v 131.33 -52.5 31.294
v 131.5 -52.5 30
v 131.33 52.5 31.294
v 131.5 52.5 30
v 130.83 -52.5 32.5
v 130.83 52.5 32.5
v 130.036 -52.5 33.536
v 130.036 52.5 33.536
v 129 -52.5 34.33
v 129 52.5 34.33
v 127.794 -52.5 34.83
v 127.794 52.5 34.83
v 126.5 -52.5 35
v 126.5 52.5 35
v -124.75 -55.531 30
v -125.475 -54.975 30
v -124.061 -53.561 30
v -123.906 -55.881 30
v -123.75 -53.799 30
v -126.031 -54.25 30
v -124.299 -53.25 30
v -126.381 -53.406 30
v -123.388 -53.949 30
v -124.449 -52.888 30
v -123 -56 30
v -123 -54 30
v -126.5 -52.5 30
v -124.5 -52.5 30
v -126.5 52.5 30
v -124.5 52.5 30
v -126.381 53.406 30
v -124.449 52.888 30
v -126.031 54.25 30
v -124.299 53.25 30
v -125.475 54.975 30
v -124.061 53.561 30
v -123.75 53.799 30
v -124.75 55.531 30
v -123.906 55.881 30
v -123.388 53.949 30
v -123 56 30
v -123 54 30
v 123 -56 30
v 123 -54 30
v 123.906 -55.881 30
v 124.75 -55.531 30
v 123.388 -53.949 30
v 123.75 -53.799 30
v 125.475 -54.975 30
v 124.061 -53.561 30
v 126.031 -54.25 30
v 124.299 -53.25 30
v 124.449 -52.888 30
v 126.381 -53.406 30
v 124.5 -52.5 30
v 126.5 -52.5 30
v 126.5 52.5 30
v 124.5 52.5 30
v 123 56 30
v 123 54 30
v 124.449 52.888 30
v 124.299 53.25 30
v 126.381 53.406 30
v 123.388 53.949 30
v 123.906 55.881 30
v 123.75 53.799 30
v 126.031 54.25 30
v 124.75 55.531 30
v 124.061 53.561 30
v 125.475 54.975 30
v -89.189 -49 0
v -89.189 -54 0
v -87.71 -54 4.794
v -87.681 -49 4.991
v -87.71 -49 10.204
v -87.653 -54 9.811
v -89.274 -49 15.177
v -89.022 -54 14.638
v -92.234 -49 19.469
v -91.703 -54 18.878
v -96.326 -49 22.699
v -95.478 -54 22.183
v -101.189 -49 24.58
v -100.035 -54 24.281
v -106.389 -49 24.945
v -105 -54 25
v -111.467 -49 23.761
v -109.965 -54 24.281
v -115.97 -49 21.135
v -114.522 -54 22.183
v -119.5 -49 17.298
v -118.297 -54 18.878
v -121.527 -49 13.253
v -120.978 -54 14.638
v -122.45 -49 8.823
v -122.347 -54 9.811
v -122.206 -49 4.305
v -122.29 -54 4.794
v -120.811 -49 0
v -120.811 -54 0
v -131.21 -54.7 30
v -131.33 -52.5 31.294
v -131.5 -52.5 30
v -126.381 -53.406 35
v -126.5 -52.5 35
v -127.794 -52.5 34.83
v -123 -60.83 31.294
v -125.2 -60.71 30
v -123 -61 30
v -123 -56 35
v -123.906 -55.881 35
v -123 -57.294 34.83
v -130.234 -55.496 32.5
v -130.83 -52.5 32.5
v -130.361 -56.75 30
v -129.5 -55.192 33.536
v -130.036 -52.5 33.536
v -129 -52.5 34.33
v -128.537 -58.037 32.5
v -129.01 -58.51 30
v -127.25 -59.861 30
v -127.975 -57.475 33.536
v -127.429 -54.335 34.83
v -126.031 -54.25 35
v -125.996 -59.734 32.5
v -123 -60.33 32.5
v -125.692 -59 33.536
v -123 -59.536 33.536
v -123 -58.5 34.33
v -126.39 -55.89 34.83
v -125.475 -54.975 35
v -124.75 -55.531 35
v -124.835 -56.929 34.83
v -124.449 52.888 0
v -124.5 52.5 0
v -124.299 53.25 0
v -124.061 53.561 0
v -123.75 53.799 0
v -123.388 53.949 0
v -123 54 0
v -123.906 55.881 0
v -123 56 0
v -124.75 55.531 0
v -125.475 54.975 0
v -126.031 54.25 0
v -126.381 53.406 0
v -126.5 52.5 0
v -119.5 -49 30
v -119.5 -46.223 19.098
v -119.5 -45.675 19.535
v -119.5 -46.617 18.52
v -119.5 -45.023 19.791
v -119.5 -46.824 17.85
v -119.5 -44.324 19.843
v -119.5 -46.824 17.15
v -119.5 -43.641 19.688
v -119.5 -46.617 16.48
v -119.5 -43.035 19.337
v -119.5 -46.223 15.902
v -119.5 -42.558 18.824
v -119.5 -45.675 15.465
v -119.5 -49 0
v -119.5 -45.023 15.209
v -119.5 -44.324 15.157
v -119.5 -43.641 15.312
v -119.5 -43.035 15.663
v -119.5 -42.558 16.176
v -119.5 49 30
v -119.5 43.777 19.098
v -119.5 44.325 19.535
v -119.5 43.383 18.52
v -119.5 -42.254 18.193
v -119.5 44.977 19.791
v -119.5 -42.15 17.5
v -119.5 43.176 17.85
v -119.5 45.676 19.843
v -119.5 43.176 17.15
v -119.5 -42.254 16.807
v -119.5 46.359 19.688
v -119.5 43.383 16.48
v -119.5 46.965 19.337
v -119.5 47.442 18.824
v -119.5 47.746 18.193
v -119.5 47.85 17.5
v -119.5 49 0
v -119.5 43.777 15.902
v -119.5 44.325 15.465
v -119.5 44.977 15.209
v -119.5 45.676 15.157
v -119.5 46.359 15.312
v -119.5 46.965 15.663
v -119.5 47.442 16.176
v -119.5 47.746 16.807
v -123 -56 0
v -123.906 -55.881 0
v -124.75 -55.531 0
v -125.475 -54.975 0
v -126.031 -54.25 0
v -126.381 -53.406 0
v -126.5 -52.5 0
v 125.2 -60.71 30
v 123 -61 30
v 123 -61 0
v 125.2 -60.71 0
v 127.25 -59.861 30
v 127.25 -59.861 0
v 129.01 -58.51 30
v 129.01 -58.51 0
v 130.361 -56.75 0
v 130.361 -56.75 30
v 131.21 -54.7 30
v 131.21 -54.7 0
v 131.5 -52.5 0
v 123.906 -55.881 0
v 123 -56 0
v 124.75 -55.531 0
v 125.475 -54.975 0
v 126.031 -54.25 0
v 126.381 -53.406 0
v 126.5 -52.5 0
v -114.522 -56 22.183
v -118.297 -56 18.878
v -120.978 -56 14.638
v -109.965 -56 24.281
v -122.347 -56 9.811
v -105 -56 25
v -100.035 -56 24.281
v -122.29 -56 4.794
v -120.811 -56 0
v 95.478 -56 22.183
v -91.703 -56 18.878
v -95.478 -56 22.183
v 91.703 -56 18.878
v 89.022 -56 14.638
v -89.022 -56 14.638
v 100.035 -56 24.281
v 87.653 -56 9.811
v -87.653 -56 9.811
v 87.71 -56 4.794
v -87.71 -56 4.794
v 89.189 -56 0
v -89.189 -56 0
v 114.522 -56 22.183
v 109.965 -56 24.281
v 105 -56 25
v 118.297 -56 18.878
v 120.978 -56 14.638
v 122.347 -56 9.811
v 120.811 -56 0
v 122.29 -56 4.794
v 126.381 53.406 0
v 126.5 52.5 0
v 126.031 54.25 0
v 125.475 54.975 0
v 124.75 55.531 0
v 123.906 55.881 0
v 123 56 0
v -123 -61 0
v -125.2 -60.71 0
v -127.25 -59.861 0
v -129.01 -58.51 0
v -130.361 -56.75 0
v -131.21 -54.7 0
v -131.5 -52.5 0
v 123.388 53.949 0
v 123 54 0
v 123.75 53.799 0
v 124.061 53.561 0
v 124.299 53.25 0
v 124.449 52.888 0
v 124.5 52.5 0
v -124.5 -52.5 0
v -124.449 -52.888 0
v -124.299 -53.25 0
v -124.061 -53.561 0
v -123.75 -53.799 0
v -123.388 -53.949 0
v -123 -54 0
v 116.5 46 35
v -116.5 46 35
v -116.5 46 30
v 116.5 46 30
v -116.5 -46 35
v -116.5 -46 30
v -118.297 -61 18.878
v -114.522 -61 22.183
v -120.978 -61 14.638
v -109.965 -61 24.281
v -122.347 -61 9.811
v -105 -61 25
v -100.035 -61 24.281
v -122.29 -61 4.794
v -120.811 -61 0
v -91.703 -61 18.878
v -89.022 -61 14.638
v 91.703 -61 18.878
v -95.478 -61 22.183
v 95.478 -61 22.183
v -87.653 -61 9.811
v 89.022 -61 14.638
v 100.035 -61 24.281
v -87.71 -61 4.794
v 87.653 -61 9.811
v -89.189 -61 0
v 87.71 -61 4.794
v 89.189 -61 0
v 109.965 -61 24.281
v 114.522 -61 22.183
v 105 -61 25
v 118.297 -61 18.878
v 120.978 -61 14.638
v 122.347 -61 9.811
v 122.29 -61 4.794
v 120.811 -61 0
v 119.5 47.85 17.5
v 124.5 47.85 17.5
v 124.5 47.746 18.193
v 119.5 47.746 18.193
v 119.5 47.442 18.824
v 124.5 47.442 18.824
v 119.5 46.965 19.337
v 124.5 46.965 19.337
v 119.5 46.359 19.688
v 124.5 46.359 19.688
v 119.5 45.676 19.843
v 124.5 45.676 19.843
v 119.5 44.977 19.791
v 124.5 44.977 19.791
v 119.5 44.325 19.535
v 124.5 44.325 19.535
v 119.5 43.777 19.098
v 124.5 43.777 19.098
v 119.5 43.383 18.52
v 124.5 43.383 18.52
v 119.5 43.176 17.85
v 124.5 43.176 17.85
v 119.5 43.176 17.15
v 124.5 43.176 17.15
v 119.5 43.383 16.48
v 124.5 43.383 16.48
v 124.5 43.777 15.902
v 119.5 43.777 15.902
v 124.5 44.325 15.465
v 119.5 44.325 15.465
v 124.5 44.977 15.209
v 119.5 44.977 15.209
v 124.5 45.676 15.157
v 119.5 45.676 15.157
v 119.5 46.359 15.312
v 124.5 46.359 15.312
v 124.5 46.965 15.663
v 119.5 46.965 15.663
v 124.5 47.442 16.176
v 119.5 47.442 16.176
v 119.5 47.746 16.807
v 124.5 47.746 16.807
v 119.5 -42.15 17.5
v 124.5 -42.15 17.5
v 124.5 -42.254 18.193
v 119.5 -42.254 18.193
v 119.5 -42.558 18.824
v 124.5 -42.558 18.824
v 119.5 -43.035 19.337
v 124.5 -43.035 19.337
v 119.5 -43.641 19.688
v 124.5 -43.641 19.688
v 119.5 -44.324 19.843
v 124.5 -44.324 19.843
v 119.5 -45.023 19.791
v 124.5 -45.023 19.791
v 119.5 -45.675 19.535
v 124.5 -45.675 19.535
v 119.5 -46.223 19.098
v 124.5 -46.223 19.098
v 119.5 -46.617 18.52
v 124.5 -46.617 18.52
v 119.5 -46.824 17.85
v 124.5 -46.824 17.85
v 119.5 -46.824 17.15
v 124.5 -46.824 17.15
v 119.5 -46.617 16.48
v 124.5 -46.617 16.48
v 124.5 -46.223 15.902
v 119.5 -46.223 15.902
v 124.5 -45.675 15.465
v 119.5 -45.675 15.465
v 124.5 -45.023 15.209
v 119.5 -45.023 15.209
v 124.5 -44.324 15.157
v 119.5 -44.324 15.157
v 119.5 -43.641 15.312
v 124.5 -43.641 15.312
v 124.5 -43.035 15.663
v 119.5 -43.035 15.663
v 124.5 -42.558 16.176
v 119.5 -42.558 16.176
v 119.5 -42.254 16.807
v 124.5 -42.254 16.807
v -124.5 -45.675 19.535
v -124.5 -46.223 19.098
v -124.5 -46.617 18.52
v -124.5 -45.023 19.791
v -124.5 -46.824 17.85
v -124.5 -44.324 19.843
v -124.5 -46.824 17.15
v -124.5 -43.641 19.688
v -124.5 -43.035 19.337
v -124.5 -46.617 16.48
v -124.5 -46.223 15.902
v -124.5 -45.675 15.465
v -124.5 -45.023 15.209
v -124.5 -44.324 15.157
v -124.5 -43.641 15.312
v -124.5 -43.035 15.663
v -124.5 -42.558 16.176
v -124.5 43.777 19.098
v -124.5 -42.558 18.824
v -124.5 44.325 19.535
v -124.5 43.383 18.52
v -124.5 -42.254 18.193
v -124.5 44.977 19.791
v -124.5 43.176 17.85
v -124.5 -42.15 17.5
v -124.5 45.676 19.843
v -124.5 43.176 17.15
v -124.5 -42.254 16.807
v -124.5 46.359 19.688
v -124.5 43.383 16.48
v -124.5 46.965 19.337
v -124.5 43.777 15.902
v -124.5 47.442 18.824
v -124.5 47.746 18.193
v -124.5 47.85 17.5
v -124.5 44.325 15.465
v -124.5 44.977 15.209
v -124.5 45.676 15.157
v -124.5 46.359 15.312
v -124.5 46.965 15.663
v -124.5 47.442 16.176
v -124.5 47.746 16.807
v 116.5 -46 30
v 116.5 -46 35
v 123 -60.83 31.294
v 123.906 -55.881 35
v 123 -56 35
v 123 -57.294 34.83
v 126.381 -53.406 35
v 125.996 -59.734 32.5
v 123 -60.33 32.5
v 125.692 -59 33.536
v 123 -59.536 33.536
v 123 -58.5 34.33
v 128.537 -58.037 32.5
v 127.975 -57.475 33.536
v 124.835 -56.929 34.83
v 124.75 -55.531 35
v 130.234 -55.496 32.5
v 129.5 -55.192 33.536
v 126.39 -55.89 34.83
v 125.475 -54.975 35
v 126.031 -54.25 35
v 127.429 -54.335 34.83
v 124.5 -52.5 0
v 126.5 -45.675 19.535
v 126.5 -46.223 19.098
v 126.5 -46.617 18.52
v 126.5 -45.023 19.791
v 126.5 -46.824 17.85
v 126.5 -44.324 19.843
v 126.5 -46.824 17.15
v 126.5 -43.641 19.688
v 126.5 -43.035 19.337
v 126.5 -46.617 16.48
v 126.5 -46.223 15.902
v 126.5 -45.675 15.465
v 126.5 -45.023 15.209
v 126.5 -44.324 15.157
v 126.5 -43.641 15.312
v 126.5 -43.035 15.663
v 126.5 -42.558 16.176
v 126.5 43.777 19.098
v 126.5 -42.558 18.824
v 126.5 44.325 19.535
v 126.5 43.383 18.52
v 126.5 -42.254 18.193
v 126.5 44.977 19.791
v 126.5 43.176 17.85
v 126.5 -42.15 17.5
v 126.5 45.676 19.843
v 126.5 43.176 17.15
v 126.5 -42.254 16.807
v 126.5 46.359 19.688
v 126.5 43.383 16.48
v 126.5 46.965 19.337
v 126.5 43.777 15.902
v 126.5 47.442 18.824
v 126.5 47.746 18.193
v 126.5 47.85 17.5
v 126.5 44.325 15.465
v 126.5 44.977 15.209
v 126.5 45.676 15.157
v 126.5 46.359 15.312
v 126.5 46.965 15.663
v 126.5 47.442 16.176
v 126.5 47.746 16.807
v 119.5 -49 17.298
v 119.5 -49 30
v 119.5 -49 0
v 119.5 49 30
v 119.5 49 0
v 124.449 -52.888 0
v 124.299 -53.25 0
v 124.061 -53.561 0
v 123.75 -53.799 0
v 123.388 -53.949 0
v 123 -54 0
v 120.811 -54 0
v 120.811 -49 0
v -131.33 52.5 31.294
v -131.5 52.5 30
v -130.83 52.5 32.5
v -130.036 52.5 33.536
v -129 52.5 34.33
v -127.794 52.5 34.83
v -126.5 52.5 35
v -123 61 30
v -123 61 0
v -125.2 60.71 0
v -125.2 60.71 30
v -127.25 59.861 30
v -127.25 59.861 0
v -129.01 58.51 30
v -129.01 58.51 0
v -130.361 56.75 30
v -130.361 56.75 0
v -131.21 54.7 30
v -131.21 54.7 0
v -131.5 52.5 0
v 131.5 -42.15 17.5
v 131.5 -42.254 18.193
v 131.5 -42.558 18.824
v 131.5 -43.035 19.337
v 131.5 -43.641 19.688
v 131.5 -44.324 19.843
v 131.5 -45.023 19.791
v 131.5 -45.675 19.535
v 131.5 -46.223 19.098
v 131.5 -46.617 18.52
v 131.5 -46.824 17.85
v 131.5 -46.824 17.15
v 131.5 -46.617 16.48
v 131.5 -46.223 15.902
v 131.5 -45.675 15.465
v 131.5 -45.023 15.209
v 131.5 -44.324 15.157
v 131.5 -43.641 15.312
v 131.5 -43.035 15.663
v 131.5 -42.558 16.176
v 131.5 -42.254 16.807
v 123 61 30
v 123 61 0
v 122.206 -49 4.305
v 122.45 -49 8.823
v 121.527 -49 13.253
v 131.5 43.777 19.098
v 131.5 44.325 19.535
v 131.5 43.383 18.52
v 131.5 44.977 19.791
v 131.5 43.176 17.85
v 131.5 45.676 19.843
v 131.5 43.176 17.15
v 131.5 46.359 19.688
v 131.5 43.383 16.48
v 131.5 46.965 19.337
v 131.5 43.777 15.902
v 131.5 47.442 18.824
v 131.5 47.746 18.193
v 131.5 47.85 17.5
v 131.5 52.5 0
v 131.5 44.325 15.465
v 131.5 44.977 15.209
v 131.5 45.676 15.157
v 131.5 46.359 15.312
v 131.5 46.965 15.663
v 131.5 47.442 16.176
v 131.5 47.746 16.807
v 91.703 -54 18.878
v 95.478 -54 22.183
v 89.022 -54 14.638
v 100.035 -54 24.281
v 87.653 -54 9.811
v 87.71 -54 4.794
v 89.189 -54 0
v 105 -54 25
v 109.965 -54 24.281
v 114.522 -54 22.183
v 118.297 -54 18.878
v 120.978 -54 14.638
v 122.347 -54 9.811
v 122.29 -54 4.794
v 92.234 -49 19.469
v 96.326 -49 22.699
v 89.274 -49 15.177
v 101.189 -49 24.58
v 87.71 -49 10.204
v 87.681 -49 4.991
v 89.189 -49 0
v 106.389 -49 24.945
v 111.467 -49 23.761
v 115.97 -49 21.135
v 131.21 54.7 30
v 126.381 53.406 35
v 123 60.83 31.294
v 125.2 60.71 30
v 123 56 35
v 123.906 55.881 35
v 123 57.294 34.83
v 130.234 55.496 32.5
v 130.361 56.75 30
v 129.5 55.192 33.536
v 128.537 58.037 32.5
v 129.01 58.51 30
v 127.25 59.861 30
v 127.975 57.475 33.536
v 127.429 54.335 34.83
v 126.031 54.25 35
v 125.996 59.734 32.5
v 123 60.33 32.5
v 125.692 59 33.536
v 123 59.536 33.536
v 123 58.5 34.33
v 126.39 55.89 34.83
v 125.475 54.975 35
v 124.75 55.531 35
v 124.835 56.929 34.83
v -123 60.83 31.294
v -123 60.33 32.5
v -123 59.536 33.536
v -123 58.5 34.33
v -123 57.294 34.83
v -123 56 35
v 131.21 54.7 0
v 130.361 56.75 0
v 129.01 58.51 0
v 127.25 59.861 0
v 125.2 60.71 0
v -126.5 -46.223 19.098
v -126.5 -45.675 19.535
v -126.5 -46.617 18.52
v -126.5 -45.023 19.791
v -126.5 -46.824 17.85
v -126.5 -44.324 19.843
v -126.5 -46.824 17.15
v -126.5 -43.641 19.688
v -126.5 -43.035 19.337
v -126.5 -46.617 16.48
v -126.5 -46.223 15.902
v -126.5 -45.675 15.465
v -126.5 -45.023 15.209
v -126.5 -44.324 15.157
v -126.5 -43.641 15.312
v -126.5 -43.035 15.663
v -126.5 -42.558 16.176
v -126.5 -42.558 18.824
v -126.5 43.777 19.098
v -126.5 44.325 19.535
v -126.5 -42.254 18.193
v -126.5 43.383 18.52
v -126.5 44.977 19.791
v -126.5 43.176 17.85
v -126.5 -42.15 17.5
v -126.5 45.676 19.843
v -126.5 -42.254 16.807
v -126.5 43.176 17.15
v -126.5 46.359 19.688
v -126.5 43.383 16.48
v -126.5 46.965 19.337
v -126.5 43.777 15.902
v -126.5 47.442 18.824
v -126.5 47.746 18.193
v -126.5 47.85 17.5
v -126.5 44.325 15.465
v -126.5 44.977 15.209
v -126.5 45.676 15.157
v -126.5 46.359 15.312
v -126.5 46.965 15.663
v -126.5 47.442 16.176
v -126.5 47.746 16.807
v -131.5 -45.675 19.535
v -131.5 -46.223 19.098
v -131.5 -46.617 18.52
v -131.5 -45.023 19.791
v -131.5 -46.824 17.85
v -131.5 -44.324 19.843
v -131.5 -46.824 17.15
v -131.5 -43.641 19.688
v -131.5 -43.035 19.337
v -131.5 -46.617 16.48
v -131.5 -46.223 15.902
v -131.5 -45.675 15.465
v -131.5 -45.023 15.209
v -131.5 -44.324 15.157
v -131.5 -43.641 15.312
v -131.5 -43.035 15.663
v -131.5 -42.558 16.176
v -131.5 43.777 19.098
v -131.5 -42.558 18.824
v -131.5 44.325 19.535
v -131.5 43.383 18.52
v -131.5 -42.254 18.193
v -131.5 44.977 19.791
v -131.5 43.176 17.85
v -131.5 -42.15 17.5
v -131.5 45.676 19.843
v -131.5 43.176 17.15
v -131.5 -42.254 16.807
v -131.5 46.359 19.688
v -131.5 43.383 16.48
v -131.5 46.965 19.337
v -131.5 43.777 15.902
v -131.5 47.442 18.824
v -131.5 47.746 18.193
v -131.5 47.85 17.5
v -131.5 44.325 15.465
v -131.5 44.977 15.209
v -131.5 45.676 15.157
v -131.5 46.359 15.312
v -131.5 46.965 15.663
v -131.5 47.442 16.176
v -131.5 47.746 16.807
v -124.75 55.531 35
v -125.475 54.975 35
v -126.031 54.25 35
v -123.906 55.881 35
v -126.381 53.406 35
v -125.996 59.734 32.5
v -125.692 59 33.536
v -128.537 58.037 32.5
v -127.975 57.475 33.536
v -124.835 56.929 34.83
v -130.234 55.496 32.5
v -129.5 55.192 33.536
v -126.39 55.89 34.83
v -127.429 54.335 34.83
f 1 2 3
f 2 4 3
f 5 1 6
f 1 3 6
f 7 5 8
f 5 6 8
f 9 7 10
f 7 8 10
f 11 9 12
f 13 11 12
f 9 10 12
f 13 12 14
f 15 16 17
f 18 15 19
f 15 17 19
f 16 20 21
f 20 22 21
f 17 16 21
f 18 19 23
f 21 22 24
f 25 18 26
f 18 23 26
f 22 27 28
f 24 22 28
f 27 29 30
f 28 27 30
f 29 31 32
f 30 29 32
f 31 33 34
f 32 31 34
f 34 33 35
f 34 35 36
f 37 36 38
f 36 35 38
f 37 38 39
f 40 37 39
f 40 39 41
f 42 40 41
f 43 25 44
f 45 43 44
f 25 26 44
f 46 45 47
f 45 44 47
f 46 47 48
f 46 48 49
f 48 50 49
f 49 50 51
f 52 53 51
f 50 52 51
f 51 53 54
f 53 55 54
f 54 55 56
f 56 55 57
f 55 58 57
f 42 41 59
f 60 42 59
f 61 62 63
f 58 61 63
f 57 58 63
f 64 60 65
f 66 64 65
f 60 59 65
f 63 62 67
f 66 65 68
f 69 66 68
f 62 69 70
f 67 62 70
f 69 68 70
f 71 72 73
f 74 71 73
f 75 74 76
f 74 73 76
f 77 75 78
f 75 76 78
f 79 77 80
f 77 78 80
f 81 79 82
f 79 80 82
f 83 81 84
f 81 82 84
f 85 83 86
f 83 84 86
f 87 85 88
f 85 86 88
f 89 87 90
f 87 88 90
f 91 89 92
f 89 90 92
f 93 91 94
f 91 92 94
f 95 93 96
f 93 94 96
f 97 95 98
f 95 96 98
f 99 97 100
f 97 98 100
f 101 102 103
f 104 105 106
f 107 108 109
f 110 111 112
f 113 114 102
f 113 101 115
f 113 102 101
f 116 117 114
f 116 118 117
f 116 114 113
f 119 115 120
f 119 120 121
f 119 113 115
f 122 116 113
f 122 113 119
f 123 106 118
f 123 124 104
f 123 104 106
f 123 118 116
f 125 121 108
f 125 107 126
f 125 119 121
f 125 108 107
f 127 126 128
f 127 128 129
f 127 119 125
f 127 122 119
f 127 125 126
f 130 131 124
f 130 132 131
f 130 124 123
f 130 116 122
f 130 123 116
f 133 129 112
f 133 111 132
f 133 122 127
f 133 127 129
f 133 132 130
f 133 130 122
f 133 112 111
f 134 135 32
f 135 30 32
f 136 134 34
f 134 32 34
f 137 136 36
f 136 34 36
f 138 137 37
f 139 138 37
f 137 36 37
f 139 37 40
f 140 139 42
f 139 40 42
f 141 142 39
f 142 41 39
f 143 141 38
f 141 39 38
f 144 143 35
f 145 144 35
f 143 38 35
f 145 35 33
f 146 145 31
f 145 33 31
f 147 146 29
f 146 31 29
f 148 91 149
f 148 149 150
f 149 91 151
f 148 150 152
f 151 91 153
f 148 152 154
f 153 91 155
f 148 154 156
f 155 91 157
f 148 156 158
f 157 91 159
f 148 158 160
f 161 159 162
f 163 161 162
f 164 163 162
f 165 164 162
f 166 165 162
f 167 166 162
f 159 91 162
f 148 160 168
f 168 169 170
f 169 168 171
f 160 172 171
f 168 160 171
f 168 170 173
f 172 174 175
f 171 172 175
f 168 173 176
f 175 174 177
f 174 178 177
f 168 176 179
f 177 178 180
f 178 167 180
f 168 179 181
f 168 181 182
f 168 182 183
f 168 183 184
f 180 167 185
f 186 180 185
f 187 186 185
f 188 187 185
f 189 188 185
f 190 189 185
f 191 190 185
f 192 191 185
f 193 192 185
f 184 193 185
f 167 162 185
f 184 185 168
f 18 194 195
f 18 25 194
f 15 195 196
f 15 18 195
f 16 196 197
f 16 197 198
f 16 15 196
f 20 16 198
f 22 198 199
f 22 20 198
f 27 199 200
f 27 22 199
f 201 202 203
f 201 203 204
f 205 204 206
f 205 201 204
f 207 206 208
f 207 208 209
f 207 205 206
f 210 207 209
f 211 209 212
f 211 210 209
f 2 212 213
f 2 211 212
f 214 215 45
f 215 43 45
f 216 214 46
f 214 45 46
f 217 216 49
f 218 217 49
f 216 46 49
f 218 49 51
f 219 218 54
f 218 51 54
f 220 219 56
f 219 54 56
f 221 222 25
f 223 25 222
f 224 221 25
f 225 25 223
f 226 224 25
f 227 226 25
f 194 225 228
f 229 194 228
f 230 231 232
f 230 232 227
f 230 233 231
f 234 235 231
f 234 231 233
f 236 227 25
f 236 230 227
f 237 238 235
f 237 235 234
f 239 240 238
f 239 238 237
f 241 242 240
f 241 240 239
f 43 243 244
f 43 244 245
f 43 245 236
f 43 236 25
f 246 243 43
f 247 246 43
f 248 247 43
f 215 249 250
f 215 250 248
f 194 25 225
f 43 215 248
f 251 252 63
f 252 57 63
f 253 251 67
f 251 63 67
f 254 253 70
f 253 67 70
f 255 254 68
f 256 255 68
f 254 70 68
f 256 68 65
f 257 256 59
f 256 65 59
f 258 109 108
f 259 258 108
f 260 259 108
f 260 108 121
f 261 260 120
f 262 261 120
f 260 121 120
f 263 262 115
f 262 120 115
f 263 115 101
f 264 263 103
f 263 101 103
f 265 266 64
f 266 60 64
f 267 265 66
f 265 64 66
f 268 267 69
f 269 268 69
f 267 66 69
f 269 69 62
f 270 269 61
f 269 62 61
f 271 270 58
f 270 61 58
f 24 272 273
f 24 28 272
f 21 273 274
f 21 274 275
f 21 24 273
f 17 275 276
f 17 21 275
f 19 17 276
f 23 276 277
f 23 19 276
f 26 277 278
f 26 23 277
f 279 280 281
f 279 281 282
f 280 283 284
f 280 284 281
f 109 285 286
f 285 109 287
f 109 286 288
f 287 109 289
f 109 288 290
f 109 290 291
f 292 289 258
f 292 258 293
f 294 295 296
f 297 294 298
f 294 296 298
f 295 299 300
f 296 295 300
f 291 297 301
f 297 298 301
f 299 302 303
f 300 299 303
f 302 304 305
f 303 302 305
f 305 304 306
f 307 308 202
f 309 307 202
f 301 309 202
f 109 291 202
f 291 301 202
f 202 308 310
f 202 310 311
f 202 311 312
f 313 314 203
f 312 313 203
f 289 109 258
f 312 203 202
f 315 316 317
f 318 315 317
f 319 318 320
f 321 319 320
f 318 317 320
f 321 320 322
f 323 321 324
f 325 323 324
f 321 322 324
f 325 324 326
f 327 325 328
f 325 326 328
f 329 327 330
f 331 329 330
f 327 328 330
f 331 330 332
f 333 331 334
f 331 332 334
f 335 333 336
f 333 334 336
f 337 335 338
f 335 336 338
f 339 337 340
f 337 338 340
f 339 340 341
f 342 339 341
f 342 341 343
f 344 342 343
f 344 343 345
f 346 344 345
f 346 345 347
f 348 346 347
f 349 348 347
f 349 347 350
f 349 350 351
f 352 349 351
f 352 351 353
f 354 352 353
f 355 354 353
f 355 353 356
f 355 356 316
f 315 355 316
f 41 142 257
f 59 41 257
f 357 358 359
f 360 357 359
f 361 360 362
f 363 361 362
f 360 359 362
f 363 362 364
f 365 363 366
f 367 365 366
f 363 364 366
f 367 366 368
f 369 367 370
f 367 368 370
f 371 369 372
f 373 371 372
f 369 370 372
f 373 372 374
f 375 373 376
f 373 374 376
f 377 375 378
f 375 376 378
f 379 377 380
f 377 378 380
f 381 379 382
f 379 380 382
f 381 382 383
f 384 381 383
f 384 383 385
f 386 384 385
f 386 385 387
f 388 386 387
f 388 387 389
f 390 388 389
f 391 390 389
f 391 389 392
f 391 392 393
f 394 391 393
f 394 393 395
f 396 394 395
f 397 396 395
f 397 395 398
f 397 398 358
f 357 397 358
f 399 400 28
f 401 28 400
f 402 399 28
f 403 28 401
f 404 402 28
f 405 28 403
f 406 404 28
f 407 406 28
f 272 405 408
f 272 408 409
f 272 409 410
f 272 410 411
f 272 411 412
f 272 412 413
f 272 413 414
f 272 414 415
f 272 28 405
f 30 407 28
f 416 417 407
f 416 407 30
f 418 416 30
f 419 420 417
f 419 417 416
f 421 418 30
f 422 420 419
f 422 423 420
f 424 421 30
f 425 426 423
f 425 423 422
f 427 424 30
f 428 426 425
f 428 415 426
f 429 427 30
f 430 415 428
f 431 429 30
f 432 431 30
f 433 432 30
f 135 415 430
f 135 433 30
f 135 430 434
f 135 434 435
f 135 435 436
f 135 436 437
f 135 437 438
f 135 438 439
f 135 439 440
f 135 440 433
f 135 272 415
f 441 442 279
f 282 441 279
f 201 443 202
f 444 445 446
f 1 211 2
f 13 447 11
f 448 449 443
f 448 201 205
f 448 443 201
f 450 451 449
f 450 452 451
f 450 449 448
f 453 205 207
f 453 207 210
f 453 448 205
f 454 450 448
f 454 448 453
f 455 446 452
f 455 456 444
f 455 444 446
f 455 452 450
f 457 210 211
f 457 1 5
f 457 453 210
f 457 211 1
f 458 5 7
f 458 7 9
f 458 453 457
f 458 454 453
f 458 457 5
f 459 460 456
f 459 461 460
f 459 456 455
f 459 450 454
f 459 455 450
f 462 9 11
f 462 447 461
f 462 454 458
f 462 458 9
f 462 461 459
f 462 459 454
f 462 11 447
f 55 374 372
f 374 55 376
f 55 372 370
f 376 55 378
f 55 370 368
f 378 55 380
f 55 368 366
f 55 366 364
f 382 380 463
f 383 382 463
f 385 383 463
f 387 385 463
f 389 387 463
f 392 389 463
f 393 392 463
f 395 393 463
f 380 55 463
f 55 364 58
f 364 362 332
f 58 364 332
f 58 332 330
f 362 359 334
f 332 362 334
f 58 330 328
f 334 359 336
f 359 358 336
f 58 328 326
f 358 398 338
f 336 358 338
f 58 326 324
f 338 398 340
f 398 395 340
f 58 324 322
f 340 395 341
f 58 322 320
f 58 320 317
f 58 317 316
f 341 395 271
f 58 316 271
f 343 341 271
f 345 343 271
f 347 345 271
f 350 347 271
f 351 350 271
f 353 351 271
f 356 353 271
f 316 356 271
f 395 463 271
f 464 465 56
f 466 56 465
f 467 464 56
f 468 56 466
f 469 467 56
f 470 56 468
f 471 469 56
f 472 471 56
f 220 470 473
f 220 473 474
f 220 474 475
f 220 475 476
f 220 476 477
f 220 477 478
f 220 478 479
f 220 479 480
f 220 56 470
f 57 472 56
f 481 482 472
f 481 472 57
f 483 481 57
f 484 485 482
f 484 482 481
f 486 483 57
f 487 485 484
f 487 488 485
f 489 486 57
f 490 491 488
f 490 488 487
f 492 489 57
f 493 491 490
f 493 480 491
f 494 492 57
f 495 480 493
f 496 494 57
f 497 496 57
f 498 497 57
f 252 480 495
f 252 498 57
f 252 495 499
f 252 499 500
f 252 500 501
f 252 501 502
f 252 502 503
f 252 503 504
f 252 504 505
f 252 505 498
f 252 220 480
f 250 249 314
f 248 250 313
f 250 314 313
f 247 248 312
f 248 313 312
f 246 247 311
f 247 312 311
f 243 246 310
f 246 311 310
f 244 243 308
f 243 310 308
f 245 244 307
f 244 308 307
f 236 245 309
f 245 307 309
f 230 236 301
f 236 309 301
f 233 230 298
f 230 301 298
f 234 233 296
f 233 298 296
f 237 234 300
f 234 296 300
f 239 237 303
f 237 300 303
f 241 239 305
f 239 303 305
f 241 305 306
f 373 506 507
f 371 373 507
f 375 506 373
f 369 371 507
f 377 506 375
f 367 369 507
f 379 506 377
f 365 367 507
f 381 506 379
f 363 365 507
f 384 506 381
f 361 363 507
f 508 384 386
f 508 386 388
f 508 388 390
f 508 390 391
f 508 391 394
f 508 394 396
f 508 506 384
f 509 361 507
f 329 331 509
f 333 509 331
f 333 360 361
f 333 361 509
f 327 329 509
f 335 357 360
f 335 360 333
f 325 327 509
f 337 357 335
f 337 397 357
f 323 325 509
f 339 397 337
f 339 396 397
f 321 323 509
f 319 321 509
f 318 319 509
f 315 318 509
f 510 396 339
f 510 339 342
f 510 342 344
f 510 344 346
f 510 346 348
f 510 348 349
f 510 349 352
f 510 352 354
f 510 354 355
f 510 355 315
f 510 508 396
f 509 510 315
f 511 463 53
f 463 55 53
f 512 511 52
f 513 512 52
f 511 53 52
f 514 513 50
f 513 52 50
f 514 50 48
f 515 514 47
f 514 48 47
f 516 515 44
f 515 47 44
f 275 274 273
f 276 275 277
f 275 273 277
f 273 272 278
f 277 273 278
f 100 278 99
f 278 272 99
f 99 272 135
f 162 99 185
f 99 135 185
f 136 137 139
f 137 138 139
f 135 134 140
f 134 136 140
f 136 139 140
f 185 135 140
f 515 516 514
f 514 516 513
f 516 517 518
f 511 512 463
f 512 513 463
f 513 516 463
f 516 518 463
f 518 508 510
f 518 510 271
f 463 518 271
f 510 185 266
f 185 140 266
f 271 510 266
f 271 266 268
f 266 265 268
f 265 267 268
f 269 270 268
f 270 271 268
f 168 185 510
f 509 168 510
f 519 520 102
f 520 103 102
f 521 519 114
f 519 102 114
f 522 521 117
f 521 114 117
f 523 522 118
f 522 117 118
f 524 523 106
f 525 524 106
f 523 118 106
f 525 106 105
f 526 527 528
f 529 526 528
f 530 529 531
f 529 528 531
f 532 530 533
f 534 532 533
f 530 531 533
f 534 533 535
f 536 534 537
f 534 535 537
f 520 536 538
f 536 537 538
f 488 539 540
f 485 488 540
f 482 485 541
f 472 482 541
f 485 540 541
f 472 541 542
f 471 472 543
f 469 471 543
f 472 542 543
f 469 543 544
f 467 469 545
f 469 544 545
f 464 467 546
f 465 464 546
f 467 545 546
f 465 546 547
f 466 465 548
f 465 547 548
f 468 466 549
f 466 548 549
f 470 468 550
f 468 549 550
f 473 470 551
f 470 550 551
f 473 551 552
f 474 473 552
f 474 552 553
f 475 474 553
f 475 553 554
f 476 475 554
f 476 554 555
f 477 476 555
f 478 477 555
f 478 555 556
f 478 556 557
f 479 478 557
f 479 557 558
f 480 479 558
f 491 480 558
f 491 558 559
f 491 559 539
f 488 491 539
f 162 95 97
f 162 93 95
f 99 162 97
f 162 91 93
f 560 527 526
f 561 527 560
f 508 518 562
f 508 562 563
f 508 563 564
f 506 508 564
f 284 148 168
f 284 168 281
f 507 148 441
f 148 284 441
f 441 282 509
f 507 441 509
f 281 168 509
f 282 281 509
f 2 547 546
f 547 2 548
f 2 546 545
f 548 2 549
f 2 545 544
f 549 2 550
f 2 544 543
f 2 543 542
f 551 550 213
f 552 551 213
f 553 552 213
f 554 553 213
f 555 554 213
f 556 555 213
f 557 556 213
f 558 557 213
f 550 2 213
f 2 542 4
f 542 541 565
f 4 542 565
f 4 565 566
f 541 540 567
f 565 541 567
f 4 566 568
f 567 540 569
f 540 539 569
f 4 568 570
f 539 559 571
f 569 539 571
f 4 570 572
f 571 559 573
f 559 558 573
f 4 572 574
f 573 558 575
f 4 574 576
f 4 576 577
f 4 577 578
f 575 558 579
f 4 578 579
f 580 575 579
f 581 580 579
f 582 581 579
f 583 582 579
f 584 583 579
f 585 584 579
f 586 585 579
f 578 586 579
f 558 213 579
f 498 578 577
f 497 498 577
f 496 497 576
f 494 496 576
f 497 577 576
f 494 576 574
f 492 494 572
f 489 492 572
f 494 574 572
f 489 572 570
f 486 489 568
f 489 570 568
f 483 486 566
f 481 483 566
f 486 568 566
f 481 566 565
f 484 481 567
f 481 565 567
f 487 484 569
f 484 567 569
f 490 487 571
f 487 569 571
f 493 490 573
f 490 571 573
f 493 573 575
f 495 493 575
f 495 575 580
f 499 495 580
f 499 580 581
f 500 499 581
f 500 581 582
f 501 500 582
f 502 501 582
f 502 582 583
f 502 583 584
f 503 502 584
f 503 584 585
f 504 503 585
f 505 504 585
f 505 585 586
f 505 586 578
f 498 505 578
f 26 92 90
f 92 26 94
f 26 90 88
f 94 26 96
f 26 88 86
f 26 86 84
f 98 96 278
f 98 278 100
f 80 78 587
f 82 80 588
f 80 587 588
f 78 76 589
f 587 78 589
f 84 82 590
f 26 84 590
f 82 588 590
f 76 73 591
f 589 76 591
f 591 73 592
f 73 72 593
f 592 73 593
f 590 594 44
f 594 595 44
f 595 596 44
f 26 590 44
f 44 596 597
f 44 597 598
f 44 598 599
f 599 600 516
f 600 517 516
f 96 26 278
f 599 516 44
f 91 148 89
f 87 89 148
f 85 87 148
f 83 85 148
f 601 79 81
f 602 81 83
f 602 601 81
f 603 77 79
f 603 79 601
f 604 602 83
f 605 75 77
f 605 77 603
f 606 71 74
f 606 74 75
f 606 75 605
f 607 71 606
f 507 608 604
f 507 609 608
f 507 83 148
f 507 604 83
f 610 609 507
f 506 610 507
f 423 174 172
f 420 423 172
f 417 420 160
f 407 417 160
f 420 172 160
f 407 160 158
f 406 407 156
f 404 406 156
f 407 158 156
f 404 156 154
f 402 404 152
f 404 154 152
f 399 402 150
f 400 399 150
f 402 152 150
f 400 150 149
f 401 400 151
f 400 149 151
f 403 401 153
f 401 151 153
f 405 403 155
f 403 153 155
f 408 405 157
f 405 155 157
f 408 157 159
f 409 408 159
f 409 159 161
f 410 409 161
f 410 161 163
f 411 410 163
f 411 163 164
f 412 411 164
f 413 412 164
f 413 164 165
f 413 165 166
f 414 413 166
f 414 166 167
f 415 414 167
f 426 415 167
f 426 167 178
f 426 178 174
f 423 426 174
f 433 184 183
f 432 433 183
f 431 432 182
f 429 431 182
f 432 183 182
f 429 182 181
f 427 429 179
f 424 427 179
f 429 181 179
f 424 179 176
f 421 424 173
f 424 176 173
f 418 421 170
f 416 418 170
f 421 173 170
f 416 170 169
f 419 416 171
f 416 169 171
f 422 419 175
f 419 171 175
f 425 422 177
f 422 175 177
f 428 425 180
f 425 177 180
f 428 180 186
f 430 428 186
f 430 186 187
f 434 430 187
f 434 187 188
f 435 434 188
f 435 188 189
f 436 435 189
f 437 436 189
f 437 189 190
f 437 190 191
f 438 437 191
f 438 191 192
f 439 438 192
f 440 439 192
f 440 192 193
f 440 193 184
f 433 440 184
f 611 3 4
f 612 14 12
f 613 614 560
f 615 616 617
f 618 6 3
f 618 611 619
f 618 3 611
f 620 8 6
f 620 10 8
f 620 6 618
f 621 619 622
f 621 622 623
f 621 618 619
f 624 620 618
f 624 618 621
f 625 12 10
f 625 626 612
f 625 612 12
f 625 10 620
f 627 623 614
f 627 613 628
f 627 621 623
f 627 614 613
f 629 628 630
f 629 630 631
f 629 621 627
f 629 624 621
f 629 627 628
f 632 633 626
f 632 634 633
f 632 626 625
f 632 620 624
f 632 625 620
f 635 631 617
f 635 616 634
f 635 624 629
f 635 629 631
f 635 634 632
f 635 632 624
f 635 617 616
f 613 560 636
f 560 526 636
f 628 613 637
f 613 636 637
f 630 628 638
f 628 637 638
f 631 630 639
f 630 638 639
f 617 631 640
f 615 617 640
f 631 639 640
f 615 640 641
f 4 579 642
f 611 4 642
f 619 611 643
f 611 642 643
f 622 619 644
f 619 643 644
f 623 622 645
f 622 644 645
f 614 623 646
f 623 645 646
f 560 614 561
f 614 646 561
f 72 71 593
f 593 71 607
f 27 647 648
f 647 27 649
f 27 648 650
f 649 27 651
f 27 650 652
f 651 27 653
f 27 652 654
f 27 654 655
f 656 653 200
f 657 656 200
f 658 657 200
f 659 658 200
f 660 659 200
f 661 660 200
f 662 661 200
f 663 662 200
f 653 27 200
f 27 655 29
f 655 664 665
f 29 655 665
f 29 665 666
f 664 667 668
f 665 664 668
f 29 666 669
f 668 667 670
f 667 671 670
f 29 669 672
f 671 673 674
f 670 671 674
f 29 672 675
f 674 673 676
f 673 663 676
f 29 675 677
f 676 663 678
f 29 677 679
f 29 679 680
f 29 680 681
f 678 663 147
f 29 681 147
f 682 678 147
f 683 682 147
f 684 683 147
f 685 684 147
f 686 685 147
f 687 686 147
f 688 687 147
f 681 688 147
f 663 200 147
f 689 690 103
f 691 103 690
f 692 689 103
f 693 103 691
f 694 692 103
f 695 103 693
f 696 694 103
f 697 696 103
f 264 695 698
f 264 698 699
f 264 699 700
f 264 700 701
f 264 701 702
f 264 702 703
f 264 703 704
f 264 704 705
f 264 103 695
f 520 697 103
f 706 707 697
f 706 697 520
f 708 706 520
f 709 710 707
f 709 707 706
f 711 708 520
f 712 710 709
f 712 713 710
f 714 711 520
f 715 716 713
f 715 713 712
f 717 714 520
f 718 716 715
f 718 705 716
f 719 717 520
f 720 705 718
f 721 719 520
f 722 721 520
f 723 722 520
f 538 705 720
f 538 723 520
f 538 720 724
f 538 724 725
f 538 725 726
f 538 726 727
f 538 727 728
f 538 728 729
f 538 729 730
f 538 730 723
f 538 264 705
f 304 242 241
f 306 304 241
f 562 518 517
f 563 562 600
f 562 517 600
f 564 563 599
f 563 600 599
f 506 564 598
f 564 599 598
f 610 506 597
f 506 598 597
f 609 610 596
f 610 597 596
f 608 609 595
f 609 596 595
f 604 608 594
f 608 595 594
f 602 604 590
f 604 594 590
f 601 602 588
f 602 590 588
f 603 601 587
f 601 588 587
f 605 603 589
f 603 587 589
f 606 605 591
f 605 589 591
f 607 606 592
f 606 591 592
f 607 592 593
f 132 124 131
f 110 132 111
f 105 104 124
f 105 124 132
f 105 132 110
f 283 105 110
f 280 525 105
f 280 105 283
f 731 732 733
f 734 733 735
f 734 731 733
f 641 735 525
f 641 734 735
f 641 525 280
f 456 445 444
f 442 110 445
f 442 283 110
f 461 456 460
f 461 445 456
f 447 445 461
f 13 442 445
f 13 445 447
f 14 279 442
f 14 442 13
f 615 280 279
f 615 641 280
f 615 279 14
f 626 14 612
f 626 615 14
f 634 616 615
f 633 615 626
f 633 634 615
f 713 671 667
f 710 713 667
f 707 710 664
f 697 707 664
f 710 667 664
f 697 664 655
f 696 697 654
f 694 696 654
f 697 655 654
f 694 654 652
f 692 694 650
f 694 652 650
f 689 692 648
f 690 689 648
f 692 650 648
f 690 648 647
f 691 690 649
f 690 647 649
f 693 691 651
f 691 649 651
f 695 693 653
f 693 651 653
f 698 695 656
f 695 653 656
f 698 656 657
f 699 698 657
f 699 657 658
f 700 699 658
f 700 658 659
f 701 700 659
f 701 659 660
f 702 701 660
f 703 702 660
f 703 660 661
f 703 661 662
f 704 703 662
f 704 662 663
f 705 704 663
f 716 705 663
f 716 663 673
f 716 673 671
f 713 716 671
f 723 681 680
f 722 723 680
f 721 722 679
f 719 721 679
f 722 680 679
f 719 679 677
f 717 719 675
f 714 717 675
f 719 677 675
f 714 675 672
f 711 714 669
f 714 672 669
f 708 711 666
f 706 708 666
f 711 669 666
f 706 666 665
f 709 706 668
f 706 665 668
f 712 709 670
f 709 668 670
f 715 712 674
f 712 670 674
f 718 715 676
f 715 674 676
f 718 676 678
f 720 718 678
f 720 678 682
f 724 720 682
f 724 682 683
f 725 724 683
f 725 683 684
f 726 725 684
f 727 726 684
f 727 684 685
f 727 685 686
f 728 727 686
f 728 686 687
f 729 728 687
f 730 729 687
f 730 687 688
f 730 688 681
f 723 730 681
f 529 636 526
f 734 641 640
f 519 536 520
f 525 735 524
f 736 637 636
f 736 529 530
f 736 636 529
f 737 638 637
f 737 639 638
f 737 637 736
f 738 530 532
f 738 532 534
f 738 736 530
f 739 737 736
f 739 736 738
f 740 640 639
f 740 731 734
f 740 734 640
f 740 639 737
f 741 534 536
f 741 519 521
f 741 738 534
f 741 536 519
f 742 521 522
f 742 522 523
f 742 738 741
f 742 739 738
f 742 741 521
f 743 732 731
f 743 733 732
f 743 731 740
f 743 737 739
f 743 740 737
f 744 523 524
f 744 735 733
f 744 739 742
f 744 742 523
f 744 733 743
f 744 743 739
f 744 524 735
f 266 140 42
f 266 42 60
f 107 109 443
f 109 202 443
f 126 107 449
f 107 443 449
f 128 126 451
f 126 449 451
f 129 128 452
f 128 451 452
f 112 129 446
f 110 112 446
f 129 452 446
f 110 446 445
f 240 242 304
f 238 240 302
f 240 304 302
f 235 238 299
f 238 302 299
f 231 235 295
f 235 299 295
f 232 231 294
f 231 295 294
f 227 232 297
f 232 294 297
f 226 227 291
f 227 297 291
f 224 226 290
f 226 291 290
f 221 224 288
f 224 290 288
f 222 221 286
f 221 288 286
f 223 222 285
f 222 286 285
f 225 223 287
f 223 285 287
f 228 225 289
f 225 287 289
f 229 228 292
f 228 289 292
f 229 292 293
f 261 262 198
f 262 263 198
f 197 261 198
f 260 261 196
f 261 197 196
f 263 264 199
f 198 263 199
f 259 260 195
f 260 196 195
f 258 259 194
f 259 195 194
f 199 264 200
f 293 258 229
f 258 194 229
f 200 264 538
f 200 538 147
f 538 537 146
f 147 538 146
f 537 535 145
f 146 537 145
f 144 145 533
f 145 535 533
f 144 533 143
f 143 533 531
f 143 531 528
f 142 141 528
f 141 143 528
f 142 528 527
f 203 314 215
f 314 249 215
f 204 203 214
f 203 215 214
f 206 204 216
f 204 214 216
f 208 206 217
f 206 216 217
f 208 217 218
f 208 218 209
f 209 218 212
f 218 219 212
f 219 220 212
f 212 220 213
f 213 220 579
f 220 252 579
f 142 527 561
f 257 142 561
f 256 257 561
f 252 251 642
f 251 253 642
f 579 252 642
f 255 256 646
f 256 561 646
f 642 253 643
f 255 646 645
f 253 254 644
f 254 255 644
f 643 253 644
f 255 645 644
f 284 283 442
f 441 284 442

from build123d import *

# Parameters (mm, degrees)
SKETCH1_W             = 263
SKETCH1_H             = 122
SKETCH1_W_2           = 253
SKETCH1_H_2           = 112
BOSS_EXTRUDE1_DEPTH   = 30
SKETCH1_W_3           = 249
SKETCH1_H_3           = 108
SKETCH1_W_4           = 239
SKETCH1_H_4           = 98
BOSS_EXTRUDE1_2_DEPTH = 30
SKETCH2_W             = 263
SKETCH2_H             = 122
BOSS_EXTRUDE2_DEPTH   = 5
FILLET1_R             = 1.5
SKETCH3_R             = 17.5
CUT_EXTRUDE1_DEPTH    = 12
FILLET2_R             = 3.5
FILLET3_R             = 8.5
FILLET4_R             = 5
SKETCH4_R             = 2.35
CUT_EXTRUDE2_DEPTH    = 279
SKETCH5_W             = 233
SKETCH5_H             = 92
CUT_EXTRUDE3_DEPTH    = 10


with BuildPart() as part:
    # Sketch1 → Boss-Extrude1 (new body)
    with BuildSketch(Plane.XY):
        Rectangle(SKETCH1_W, SKETCH1_H)
        Rectangle(SKETCH1_W_2, SKETCH1_H_2, mode=Mode.SUBTRACT)
    extrude(amount=BOSS_EXTRUDE1_DEPTH)



with BuildPart() as body_2:
    # Sketch1 → Boss-Extrude1 2 (new body)
    with BuildSketch(Plane.XY):
        Rectangle(SKETCH1_W_3, SKETCH1_H_3)
        Rectangle(SKETCH1_W_4, SKETCH1_H_4, mode=Mode.SUBTRACT)
    extrude(amount=BOSS_EXTRUDE1_2_DEPTH)


with BuildPart() as part_1:
    add(part.part)

    add(body_2.part)  # Boss-Extrude2 merges body 2
    # Sketch2 → Boss-Extrude2 (add)
    with BuildSketch(Plane.XY.offset(30)):
        Rectangle(SKETCH2_W, SKETCH2_H)
    extrude(amount=BOSS_EXTRUDE2_DEPTH)

    # Fillet1
    fillet1_edges = [part_1.edges().sort_by_distance(p)[0] for p in [
        (-124.5, -54, 15),
        (124.5, -54, 15),
        (124.5, 54, 15),
        (-124.5, 54, 15),
    ]]
    fillet(fillet1_edges, radius=FILLET1_R)

    # Sketch3 → Cut-Extrude1 (cut)
    with BuildSketch(Plane(origin=(0, -61, 0), x_dir=(-1, 0, 0), z_dir=(0, -1, 0))):
        with Locations((105, -7.5)):
            Circle(SKETCH3_R)
        with Locations((-105, -7.5)):
            Circle(SKETCH3_R)
    extrude(amount=-CUT_EXTRUDE1_DEPTH, mode=Mode.SUBTRACT)

    # Fillet2
    fillet2_edges = [part_1.edges().sort_by_distance(p)[0] for p in [
        (126.5, 56, 15),
        (-126.5, 56, 15),
        (-126.5, -56, 15),
        (126.5, -56, 15),
    ]]
    fillet(fillet2_edges, radius=FILLET2_R)

    # Fillet3
    fillet3_edges = [part_1.edges().sort_by_distance(p)[0] for p in [
        (-131.5, -61, 17.5),
        (-131.5, 61, 17.5),
        (131.5, 61, 17.5),
        (131.5, -61, 17.5),
    ]]
    fillet(fillet3_edges, radius=FILLET3_R)

    # Fillet4
    fillet4_edges = [part_1.edges().sort_by_distance(p)[0] for p in [
        (0, -61, 35),
        (-131.5, 0, 35),
        (131.5, 0, 35),
        (0, 61, 35),
        (-129.01040764, 58.51040764, 35),
        (129.01040764, 58.51040764, 35),
        (129.01040764, -58.51040764, 35),
        (-129.01040764, -58.51040764, 35),
    ]]
    fillet(fillet4_edges, radius=FILLET4_R)

    # Sketch4 → Cut-Extrude2 (cut)
    with BuildSketch(Plane(origin=(131.5, 0, 0), x_dir=(0, 0, -1), z_dir=(1, 0, 0))):
        with Locations(Location((-17.5, -44.5, 0), (0, 0, 90))):
            Circle(SKETCH4_R)
        with Locations(Location((-17.5, 45.5, 0), (0, 0, 90))):
            Circle(SKETCH4_R)
    extrude(amount=-CUT_EXTRUDE2_DEPTH, mode=Mode.SUBTRACT)

    # Sketch5 → Cut-Extrude3 (cut)
    with BuildSketch(Plane.XY.offset(35)):
        Rectangle(SKETCH5_W, SKETCH5_H)
    extrude(amount=-CUT_EXTRUDE3_DEPTH, mode=Mode.SUBTRACT)


solid = part_1.part
